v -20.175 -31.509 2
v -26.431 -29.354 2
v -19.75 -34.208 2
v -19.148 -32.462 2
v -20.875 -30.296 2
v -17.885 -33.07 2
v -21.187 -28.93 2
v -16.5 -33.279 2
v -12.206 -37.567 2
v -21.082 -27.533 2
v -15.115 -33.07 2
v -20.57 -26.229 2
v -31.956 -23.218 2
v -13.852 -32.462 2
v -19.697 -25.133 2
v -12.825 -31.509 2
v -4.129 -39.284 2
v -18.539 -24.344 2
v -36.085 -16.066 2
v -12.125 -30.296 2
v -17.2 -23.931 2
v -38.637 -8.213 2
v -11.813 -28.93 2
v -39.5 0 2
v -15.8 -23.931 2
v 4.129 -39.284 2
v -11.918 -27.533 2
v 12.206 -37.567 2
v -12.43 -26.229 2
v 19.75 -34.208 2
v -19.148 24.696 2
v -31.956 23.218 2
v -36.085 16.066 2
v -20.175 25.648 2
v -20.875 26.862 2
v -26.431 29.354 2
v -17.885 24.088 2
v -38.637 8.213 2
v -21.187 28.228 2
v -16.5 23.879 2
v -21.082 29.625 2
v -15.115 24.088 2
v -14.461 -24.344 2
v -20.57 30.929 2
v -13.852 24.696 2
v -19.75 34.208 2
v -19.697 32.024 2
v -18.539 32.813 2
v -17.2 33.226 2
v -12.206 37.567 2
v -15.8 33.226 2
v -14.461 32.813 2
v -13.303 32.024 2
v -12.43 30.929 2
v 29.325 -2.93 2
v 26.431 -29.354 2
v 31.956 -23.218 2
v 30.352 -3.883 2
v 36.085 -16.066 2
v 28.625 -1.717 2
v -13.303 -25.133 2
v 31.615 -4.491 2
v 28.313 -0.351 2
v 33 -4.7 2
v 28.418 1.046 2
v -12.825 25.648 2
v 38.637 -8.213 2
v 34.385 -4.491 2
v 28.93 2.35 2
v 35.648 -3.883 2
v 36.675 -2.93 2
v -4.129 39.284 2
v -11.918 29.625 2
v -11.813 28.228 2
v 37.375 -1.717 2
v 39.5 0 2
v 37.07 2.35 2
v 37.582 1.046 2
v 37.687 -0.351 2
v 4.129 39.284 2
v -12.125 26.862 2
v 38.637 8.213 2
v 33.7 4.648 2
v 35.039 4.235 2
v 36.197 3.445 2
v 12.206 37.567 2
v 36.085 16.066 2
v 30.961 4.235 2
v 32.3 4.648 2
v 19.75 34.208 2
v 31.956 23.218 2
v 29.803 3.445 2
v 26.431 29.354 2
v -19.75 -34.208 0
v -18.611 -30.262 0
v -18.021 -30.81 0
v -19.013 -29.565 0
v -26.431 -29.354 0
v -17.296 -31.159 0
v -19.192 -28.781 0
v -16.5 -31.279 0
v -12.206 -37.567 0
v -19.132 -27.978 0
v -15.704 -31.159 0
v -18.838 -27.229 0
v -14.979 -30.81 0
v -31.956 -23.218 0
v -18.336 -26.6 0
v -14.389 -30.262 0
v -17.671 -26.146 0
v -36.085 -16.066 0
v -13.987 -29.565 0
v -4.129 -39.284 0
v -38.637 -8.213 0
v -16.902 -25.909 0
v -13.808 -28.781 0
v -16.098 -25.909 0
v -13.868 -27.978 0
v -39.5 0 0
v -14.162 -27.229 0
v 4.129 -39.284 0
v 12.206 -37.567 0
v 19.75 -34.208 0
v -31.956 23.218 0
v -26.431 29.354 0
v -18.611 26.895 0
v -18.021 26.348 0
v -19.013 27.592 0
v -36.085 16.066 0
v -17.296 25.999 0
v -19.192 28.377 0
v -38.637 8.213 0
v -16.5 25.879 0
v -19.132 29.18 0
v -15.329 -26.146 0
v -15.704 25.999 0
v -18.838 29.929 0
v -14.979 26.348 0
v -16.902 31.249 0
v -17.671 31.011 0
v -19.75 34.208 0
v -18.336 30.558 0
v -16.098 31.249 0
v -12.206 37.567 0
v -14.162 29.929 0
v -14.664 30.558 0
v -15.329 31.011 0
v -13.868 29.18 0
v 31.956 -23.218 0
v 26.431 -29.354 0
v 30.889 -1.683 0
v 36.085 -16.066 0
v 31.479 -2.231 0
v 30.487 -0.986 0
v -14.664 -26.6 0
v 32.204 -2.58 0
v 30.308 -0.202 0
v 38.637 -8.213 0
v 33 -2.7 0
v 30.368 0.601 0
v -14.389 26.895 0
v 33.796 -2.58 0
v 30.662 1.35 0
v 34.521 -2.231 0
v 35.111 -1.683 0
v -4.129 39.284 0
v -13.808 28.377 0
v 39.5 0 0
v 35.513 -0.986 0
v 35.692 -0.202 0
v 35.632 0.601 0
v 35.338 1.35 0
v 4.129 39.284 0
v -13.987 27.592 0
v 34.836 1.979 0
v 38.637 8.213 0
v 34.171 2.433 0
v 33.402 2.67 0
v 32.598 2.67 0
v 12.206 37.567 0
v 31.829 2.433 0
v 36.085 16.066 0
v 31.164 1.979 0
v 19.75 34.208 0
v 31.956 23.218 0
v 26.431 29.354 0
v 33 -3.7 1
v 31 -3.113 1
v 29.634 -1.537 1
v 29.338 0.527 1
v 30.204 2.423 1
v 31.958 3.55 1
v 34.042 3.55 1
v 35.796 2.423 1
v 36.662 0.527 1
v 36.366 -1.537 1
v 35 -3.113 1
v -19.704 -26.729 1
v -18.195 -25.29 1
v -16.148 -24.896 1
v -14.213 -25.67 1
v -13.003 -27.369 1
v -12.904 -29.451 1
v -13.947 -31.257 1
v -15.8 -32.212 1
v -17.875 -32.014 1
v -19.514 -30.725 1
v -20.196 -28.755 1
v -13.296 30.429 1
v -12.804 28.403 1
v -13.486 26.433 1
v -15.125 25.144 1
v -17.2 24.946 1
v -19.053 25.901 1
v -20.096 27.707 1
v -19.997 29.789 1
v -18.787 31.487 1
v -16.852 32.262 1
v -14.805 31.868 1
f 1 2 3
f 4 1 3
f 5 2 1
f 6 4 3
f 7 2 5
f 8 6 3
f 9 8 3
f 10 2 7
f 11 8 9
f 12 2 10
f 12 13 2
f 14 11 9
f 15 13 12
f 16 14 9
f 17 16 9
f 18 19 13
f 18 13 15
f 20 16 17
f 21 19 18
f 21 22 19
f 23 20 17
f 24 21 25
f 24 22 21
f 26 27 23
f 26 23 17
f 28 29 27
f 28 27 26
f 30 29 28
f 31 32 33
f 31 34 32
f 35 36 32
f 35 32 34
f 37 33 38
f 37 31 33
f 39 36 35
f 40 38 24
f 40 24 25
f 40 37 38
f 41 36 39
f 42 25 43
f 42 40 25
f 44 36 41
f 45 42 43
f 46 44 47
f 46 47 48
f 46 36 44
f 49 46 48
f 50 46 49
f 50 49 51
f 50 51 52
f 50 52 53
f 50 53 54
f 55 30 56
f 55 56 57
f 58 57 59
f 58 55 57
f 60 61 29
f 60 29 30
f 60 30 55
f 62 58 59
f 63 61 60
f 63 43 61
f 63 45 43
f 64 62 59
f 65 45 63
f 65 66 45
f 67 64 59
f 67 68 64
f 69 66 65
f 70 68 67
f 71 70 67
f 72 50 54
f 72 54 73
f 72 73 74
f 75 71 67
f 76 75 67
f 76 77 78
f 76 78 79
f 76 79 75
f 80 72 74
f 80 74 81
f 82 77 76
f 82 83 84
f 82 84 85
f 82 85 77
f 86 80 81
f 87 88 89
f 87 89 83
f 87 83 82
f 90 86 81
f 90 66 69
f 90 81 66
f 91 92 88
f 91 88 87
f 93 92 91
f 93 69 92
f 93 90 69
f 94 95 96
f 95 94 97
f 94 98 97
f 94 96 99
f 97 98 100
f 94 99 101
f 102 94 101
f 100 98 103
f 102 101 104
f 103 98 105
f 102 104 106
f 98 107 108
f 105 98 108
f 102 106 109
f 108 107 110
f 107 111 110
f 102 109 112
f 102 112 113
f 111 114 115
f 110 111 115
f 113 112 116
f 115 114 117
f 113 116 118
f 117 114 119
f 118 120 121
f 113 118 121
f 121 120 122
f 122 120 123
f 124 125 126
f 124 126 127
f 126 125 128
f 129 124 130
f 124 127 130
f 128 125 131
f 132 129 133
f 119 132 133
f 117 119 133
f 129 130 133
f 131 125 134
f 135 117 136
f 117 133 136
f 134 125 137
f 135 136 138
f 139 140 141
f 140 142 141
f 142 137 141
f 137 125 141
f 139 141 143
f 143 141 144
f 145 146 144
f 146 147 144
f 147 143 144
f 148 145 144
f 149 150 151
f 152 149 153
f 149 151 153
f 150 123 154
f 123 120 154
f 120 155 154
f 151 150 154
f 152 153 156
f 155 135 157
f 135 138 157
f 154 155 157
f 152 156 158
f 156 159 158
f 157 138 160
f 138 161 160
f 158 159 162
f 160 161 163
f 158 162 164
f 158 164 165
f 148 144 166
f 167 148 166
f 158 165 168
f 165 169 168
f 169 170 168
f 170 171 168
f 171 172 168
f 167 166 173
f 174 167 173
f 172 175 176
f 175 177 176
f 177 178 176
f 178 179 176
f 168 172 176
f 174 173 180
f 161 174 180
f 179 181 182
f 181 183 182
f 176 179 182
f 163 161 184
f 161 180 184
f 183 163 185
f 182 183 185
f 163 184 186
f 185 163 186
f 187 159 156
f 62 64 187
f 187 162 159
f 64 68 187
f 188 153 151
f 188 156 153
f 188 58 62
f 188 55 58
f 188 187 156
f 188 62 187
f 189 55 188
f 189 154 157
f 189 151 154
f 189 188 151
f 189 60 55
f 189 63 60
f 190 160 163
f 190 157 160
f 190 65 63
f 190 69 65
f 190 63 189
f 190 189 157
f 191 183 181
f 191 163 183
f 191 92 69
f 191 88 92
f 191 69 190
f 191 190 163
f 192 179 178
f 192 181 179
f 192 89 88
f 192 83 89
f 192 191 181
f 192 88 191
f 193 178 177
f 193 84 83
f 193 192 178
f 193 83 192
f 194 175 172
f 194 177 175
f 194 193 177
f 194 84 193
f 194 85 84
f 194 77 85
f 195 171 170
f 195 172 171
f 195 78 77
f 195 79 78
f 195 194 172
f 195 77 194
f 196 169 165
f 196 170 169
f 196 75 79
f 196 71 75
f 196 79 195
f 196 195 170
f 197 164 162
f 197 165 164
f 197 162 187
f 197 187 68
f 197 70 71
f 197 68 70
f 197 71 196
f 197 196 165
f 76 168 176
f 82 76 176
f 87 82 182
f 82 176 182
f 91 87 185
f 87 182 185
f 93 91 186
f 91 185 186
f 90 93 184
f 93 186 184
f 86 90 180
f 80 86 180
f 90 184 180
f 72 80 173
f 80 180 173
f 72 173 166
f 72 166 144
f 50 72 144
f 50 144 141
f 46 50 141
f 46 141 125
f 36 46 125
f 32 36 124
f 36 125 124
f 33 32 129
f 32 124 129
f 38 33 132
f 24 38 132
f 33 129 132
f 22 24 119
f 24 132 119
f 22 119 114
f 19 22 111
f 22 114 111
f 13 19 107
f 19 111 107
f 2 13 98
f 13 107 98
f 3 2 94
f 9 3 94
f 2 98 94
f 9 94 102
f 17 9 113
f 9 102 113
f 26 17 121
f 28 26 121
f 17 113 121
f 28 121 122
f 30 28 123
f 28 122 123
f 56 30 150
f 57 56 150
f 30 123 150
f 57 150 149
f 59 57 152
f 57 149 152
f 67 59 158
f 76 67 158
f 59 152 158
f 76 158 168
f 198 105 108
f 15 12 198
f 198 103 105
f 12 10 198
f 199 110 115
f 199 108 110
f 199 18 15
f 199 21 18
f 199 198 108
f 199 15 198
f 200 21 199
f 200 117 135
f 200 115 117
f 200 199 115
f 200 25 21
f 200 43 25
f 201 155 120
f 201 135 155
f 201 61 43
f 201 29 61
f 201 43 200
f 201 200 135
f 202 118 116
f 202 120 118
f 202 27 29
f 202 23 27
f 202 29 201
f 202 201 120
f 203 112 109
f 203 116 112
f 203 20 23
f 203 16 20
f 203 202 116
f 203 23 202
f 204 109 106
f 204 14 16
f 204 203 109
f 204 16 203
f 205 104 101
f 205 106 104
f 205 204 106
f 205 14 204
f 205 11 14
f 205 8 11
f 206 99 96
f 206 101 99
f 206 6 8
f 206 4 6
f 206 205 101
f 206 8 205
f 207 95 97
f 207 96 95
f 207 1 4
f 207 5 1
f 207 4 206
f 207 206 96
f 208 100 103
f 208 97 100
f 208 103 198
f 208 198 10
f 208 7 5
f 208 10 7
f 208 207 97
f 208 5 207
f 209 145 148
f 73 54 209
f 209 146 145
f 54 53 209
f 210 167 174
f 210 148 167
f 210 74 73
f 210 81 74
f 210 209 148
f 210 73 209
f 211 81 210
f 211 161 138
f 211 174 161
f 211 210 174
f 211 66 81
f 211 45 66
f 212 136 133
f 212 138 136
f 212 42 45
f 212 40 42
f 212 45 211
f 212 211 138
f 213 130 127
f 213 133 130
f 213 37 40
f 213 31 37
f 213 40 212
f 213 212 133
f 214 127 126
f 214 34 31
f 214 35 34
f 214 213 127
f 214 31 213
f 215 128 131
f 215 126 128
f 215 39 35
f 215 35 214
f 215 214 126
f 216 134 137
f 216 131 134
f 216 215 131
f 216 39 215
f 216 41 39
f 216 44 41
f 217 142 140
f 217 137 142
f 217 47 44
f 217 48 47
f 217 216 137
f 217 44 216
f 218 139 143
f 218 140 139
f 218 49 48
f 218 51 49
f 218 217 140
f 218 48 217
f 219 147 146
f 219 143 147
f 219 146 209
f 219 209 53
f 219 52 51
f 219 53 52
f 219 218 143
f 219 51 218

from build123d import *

# Parameters (mm, degrees)
SKETCH1_R           = 39.5
BOSS_EXTRUDE1_DEPTH = 2
CIRPATTERN1_COUNT   = 3


with BuildPart() as part:
    # Sketch1 → Boss-Extrude1 (new body)
    with BuildSketch(Plane.XY):
        Circle(SKETCH1_R)
    extrude(amount=BOSS_EXTRUDE1_DEPTH)

    # Sketch3 → CSK for M4 Flat Head Machine Screw1 (revolve, cut)
    with BuildSketch(Plane(origin=(33, 0, 2), x_dir=(0, -1, 0), z_dir=(1, 0, 0))):
        Polygon((0, 0), (0, 27.391936393), (2.25, 26.04), (2.25, 2.45), (4.7, 0), align=None)
    csk_for_m4_flat_head_machine_screw1 = revolve(axis=Axis((33, 0, 8.35), (0, 0, -1)), mode=Mode.SUBTRACT)

    # CirPattern1: CSK for M4 Flat Head Machine Screw1 ×3 about axis
    cirpattern1_axis = Axis((0, 0, 0), (0, 0, 1))
    for i in range(1, CIRPATTERN1_COUNT):
        add(csk_for_m4_flat_head_machine_screw1.rotate(cirpattern1_axis, i * 360 / CIRPATTERN1_COUNT), mode=Mode.SUBTRACT)


solid = part.part
